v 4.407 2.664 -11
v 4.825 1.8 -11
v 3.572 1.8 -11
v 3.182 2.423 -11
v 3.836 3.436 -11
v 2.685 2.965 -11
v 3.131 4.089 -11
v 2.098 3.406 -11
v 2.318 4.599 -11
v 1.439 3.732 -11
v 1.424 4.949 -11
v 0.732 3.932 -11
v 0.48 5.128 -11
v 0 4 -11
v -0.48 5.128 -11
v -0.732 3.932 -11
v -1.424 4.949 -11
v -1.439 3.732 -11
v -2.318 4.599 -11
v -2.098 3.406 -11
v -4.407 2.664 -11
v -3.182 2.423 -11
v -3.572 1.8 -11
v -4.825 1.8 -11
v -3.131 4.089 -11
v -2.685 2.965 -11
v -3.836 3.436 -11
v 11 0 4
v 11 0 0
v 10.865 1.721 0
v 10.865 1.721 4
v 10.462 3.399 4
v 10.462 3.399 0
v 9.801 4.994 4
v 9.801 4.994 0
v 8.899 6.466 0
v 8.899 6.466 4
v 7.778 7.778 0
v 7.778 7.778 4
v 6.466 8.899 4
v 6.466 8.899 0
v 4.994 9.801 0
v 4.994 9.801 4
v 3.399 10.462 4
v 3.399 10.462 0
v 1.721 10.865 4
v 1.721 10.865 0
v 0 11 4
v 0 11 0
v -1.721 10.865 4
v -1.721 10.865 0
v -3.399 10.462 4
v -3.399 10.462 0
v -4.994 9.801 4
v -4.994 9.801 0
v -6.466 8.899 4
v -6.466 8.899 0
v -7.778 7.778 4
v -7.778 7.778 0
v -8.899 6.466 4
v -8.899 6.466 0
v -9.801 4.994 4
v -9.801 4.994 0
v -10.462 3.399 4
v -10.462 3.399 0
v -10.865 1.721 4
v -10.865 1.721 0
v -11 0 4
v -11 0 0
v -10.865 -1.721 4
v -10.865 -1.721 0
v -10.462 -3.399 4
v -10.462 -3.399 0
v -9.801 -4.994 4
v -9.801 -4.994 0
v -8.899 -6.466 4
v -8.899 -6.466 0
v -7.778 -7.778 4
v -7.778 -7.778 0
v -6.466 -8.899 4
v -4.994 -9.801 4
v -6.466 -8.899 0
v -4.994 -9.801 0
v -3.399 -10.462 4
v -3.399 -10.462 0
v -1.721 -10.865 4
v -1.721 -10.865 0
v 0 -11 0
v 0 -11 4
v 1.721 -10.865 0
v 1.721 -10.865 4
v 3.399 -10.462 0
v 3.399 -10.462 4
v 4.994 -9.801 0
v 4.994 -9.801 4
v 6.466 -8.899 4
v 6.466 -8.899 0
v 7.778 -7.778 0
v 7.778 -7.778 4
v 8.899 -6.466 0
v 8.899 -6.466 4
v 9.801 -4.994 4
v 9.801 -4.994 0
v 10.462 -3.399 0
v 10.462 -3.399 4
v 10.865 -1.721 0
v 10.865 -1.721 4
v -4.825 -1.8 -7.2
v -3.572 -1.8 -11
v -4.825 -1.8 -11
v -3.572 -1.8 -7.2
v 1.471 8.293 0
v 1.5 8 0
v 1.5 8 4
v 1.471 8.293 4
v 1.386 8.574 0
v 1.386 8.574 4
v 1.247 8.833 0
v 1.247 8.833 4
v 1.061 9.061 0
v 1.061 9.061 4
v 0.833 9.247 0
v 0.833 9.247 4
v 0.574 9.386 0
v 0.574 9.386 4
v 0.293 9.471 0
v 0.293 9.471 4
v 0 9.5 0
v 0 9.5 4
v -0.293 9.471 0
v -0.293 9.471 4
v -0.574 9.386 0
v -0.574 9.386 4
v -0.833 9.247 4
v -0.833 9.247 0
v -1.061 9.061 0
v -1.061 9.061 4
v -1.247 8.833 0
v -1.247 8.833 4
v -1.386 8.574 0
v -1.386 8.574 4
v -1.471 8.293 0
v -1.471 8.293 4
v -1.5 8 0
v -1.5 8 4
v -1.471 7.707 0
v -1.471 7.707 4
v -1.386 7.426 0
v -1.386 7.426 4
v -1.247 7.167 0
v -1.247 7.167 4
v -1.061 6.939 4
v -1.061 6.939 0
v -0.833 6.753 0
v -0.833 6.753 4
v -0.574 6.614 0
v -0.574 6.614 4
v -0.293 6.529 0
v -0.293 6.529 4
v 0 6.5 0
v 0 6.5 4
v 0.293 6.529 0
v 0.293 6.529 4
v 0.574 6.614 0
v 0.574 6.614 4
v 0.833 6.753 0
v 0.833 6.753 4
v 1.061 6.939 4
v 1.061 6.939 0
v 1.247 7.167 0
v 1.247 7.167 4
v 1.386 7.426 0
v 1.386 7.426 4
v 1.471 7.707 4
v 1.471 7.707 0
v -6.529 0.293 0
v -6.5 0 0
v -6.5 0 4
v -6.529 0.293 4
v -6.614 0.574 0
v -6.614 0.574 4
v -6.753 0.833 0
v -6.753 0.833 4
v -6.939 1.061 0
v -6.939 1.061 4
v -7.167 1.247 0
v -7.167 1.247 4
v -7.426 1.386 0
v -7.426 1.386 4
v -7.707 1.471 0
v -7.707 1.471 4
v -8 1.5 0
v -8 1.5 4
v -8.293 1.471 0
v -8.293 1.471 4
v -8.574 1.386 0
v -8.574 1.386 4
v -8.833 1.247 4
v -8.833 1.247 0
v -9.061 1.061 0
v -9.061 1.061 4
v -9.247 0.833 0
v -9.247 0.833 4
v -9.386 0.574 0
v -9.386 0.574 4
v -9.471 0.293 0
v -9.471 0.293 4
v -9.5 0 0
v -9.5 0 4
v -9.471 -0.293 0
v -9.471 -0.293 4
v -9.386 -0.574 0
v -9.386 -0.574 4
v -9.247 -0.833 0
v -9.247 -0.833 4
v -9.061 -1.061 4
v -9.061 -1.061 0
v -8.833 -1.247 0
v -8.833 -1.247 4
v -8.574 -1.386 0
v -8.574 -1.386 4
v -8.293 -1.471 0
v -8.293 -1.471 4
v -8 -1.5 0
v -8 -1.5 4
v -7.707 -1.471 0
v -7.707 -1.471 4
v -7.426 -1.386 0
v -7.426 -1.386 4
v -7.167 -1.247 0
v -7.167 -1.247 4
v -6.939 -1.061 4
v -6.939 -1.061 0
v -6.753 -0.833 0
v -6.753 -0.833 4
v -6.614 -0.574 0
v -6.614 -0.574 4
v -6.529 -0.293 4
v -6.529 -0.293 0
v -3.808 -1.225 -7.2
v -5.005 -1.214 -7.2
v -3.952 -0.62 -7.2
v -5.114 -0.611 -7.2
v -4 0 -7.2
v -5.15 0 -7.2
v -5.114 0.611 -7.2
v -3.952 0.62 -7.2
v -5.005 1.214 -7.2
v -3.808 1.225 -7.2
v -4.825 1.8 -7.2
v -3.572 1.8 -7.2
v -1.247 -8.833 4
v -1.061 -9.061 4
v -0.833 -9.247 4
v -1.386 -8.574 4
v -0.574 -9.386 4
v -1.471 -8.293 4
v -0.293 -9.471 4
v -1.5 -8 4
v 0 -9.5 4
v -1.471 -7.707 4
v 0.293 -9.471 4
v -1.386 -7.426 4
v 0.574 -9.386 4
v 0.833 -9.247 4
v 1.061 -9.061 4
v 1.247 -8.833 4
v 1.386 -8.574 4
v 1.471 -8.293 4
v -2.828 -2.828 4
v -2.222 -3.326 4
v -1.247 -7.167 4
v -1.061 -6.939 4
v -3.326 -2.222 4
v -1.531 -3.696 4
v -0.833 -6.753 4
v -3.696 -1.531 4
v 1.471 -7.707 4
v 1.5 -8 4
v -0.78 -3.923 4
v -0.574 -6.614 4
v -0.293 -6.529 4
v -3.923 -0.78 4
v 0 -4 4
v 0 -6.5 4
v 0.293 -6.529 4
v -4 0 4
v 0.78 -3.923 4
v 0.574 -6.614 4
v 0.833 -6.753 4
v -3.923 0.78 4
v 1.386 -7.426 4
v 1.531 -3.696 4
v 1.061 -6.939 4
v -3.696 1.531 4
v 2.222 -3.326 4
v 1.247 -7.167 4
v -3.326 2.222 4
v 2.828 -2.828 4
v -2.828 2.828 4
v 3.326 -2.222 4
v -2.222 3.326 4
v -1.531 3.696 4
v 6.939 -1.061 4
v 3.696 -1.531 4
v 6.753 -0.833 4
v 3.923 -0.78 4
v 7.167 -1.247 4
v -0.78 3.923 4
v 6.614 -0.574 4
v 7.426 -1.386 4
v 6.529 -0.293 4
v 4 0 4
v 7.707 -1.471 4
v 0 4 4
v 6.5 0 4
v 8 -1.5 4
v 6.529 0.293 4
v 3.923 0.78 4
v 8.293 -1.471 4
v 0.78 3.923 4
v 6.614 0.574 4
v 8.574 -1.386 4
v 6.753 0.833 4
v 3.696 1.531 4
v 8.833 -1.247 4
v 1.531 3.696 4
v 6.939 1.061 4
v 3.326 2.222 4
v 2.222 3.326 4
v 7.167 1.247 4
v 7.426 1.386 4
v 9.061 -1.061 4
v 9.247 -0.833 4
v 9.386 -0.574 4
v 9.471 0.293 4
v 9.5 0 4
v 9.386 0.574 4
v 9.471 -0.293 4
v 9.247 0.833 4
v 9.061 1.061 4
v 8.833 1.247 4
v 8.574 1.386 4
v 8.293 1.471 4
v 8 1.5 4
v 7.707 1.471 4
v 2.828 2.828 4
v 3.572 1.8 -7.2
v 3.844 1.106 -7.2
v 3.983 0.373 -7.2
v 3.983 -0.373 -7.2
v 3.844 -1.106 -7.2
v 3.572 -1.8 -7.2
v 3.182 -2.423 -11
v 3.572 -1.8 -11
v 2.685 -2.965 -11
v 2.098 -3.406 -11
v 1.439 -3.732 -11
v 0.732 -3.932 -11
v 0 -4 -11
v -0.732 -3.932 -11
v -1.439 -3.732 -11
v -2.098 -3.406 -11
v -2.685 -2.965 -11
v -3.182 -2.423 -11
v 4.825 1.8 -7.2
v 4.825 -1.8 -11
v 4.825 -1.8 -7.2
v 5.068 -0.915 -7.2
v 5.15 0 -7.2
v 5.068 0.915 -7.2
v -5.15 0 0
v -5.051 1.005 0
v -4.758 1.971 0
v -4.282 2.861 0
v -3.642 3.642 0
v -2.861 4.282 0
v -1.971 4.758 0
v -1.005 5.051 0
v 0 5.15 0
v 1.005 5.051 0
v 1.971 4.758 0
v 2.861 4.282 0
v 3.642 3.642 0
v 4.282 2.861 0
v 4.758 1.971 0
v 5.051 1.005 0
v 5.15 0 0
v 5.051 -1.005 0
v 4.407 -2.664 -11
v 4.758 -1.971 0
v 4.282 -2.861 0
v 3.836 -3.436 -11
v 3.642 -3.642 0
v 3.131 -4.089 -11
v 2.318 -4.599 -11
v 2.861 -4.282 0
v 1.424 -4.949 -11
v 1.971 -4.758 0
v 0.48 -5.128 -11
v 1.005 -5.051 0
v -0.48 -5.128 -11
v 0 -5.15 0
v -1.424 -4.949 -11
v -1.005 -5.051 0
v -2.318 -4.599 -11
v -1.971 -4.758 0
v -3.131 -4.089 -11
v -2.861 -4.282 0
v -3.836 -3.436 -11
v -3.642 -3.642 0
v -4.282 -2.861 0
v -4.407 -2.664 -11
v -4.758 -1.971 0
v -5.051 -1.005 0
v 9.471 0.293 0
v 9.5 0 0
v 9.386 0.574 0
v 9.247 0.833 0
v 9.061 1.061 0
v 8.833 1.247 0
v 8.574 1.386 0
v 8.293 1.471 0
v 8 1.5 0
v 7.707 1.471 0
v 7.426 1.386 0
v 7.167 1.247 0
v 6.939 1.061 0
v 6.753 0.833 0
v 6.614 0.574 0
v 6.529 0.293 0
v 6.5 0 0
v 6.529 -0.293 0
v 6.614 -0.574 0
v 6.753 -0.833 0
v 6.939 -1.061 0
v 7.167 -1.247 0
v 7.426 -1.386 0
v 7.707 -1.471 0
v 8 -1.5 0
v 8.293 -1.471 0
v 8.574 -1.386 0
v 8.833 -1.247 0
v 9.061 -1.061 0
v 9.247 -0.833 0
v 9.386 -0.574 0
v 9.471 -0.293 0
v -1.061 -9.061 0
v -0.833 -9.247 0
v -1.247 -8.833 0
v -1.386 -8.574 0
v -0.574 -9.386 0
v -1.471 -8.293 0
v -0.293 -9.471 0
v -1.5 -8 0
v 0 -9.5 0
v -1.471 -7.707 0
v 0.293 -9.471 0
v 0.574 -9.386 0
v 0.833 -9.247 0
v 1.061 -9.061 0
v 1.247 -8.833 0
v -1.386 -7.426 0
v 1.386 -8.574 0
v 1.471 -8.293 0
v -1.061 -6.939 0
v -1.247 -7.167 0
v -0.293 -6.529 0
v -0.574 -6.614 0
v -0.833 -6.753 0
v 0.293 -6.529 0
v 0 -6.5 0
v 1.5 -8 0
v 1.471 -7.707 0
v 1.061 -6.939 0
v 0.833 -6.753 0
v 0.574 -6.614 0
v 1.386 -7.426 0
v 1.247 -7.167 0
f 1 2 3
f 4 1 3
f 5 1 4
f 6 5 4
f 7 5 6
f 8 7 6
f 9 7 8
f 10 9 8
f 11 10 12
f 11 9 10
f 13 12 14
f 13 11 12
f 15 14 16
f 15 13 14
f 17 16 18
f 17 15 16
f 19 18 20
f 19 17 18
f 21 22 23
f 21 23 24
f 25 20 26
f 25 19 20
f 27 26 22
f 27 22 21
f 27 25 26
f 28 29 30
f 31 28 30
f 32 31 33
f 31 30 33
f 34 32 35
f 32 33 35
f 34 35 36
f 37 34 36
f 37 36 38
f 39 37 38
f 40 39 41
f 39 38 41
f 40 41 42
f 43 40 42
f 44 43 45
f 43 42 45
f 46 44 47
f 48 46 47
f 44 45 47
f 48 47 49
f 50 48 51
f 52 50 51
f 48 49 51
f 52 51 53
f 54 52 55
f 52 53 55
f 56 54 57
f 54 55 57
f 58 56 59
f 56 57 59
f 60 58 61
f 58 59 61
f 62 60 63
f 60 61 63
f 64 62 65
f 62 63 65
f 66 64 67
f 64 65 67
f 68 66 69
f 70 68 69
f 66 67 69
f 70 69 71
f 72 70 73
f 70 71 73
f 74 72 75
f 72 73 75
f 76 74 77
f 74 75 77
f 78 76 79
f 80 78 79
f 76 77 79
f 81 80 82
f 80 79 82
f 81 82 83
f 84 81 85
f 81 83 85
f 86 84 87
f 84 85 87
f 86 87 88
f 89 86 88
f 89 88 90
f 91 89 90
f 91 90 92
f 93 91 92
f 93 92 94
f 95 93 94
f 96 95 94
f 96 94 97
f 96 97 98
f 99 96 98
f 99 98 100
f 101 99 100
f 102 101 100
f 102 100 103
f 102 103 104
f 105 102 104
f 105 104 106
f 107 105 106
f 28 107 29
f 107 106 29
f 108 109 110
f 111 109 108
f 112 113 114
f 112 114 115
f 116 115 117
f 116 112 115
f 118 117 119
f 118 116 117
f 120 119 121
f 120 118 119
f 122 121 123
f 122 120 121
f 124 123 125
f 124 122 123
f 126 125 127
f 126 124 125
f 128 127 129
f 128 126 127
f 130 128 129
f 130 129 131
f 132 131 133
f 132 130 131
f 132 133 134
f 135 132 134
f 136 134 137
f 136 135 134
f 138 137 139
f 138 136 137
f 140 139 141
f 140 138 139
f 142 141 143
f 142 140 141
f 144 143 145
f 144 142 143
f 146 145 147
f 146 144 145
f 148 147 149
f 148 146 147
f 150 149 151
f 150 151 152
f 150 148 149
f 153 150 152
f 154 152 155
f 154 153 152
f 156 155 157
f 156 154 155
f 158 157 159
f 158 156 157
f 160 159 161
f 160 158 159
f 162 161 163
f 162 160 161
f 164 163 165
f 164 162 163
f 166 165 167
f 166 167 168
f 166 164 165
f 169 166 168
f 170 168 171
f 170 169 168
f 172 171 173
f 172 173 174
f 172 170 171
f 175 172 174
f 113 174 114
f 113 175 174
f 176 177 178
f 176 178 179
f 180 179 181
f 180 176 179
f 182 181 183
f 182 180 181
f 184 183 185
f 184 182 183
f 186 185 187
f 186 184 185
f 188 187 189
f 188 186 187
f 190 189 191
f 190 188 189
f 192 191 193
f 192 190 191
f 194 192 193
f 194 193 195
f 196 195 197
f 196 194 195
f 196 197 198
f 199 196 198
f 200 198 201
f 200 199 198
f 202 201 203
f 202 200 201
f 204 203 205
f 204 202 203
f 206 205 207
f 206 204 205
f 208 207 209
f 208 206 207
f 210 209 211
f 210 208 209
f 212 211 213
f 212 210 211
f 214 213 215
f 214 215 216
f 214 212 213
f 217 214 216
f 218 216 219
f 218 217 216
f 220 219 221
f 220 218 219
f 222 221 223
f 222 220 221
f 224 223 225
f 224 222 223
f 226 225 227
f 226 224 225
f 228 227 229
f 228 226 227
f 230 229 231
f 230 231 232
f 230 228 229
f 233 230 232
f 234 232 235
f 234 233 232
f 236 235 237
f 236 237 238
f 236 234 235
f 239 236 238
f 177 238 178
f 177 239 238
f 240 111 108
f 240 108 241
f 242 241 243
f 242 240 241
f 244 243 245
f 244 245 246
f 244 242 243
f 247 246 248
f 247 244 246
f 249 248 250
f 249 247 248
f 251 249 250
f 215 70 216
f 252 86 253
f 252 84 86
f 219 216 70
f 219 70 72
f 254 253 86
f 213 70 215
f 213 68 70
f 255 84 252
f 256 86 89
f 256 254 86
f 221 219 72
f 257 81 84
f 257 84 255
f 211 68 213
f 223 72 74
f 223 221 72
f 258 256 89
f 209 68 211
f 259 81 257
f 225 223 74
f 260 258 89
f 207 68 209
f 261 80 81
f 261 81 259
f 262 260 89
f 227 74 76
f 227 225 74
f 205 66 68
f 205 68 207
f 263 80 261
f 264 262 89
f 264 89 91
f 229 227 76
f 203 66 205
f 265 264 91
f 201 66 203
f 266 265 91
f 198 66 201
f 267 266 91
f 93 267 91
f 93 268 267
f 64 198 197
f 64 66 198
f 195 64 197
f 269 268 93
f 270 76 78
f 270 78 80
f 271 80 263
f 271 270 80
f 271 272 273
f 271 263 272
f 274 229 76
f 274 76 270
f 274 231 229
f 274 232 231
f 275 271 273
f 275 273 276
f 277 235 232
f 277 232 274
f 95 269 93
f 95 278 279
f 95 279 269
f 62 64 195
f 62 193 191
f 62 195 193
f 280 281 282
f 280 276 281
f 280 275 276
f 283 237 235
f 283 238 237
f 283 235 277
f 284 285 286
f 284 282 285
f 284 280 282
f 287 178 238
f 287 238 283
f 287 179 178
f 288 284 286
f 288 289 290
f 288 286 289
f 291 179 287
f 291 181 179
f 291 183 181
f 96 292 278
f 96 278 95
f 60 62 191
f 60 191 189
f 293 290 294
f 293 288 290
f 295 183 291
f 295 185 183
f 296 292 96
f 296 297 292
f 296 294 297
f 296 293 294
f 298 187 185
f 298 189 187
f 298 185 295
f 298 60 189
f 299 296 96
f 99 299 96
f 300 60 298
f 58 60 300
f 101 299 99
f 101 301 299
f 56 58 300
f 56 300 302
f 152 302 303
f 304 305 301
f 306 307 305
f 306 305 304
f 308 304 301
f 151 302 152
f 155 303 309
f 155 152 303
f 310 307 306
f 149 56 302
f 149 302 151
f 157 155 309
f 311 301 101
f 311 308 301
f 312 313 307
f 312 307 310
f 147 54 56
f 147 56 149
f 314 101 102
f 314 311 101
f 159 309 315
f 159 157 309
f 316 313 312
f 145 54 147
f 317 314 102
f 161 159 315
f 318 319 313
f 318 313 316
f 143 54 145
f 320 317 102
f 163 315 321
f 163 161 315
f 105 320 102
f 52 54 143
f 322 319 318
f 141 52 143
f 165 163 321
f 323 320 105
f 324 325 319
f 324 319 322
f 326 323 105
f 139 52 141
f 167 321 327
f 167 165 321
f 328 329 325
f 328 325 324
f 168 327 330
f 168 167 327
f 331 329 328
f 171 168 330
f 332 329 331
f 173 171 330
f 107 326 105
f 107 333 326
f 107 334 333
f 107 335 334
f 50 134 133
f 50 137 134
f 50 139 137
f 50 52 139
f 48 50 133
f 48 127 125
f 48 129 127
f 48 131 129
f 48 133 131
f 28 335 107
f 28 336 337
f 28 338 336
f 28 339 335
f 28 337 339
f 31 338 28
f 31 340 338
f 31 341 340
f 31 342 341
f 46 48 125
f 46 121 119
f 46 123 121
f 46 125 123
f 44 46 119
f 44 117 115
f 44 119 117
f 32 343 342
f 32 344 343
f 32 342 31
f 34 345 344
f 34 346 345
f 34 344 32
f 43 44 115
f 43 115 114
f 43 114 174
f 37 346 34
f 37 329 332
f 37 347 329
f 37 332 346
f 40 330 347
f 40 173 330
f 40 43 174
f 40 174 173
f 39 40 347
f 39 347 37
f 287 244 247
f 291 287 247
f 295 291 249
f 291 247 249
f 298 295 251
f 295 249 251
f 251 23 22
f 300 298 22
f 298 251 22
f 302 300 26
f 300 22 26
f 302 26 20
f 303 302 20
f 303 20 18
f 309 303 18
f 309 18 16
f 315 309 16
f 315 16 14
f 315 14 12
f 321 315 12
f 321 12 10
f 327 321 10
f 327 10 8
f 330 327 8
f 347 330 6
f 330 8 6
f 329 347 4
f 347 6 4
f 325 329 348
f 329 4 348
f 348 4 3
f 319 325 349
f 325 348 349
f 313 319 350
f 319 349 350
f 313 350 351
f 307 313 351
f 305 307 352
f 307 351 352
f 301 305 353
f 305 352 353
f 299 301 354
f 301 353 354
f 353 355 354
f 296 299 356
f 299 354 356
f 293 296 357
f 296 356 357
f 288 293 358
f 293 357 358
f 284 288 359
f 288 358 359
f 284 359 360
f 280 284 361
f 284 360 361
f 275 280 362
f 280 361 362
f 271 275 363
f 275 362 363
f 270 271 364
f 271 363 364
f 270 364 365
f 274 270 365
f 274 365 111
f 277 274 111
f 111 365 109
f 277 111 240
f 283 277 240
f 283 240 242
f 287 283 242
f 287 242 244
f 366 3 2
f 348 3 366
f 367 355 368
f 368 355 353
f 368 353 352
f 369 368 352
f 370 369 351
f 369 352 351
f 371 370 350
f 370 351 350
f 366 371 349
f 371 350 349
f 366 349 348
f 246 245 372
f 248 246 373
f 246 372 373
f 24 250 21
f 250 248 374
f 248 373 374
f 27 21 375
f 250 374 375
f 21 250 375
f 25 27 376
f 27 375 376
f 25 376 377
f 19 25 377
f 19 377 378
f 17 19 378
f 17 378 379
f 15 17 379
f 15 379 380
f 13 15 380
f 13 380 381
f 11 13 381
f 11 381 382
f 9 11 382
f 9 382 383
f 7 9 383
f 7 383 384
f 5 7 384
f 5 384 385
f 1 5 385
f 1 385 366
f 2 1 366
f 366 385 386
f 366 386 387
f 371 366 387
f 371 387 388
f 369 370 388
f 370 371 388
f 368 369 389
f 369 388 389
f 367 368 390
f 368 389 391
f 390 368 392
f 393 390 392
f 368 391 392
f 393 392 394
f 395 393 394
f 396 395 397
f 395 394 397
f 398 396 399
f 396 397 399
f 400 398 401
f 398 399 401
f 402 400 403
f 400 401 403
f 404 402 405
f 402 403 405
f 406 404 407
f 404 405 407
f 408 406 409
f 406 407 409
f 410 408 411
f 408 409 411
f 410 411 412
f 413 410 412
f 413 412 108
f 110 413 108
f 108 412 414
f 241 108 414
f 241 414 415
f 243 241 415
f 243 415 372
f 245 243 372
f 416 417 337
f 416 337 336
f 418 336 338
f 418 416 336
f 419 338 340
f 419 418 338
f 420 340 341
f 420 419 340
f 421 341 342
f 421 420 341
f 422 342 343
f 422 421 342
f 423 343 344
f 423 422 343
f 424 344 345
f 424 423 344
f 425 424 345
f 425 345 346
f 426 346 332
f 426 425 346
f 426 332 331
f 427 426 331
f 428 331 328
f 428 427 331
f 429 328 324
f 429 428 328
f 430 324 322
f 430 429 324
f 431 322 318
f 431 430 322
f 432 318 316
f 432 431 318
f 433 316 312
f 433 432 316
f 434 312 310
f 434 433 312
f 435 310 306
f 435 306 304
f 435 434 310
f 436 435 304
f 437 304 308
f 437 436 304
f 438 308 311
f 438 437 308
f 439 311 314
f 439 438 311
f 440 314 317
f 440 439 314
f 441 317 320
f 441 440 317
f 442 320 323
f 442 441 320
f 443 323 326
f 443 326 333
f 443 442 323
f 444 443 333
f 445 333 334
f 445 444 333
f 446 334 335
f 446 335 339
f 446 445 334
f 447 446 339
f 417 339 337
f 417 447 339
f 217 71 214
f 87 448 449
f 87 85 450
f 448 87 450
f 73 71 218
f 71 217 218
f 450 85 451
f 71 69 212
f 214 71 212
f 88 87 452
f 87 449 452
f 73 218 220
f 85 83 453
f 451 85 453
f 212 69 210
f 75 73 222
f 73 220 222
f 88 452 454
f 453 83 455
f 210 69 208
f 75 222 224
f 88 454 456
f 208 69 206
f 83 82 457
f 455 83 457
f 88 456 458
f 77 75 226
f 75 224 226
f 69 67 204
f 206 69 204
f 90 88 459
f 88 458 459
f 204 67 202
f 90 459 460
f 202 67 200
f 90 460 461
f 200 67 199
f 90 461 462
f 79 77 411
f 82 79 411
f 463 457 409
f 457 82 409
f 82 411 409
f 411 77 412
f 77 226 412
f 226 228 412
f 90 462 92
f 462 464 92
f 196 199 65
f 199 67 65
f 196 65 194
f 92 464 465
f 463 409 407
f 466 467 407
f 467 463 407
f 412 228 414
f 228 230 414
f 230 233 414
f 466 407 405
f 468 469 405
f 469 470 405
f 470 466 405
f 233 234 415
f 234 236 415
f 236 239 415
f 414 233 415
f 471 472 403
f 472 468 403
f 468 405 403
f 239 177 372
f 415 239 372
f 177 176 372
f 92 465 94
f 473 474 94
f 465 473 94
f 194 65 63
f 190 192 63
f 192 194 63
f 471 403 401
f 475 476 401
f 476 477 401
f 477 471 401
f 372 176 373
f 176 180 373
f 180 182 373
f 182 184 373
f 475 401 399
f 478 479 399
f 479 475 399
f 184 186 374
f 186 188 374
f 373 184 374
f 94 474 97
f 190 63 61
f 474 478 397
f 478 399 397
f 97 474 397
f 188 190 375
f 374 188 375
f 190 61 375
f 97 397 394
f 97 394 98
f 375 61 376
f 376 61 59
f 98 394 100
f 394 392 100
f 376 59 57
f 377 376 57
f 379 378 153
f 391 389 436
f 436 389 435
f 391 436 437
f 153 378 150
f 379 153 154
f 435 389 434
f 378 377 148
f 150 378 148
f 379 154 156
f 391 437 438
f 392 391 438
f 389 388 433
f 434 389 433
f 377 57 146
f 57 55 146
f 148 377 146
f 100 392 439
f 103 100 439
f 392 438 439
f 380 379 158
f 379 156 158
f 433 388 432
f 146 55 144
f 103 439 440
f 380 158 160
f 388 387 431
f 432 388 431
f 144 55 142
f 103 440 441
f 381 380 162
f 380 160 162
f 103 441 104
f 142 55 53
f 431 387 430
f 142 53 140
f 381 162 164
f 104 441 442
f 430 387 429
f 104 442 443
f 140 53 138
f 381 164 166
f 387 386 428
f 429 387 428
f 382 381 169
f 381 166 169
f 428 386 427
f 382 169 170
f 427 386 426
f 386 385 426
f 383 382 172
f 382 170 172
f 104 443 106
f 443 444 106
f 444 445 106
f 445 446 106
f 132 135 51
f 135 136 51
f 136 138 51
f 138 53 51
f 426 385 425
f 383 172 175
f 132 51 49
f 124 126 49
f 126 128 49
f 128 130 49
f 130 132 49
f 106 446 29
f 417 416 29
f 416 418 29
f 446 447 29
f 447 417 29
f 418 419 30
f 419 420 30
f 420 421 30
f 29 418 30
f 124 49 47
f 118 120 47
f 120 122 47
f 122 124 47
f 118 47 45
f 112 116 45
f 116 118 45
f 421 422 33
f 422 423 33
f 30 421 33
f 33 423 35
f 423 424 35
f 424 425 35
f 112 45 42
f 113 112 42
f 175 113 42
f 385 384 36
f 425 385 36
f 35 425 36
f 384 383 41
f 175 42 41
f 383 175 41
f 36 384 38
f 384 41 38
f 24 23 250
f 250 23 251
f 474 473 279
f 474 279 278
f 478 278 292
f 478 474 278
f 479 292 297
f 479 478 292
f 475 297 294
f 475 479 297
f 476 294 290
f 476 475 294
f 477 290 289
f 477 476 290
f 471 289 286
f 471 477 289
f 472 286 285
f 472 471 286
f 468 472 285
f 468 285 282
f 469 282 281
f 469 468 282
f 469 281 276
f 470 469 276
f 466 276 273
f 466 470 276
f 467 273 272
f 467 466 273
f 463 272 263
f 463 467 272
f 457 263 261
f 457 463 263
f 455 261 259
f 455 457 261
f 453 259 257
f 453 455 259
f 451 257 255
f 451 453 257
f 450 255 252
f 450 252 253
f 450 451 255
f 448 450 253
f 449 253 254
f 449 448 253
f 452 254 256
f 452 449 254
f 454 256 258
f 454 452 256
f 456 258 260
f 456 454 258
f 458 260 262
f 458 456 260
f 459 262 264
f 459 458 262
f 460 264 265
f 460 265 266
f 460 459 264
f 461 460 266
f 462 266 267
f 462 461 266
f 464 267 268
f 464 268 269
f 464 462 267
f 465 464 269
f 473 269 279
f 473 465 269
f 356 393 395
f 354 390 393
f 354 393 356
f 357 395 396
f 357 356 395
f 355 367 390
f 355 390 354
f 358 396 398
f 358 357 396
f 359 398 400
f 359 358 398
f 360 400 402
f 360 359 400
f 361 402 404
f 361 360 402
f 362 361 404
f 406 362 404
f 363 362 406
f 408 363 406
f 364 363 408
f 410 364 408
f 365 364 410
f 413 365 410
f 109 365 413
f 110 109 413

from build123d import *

# Parameters (mm, degrees)
SKETCH_1_R               = 11
SKETCH_1_R_2             = 1.5
EXTRUDE_1_DEPTH          = 4
SKETCH_2_R               = 5.15
EXTRUDE_2_DEPTH          = 11
SKETCH_3_R               = 4
CUT_EXTRUDE_1_DEPTH      = 1
CUT_EXTRUDE_1_DEPTH_BACK = 16
SKETCH_6_W               = 3.8
SKETCH_6_H               = 3.6
CUT_EXTRUDE_2_DEPTH      = 12
CUT_EXTRUDE_2_DEPTH_BACK = 12


with BuildPart() as part:
    # 草图1 → 凸台-拉伸1 (new body)
    with BuildSketch(Plane.XY):
        Circle(SKETCH_1_R)
        with Locations((-8, 0)):
            Circle(SKETCH_1_R_2, mode=Mode.SUBTRACT)
        with Locations((0, 8)):
            Circle(SKETCH_1_R_2, mode=Mode.SUBTRACT)
        with Locations((8, 0)):
            Circle(SKETCH_1_R_2, mode=Mode.SUBTRACT)
        with Locations((0, -8)):
            Circle(SKETCH_1_R_2, mode=Mode.SUBTRACT)
    extrude(amount=EXTRUDE_1_DEPTH)

    # 草图2 → 凸台-拉伸2 (add)
    with BuildSketch(Plane(origin=(0, 0, 0), x_dir=(-1, 0, 0), z_dir=(0, 0, -1))):
        Circle(SKETCH_2_R)
    extrude(amount=EXTRUDE_2_DEPTH)

    # 草图3 → 切除-拉伸1 (cut, two sides)
    with BuildSketch(Plane(origin=(0, 0, -11), x_dir=(-1, 0, 0), z_dir=(0, 0, -1))) as cut_extrude_1_sk:
        Circle(SKETCH_3_R)
    extrude(amount=CUT_EXTRUDE_1_DEPTH, mode=Mode.SUBTRACT)
    extrude(cut_extrude_1_sk.sketch, amount=-CUT_EXTRUDE_1_DEPTH_BACK, mode=Mode.SUBTRACT)

    # 草图6 → 切除-拉伸2 (cut, two sides)
    with BuildSketch(Plane.ZY) as cut_extrude_2_sk:
        with Locations((-9.1, 0)):
            Rectangle(SKETCH_6_W, SKETCH_6_H)
    extrude(amount=CUT_EXTRUDE_2_DEPTH, mode=Mode.SUBTRACT)
    extrude(cut_extrude_2_sk.sketch, amount=-CUT_EXTRUDE_2_DEPTH_BACK, mode=Mode.SUBTRACT)


solid = part.part
